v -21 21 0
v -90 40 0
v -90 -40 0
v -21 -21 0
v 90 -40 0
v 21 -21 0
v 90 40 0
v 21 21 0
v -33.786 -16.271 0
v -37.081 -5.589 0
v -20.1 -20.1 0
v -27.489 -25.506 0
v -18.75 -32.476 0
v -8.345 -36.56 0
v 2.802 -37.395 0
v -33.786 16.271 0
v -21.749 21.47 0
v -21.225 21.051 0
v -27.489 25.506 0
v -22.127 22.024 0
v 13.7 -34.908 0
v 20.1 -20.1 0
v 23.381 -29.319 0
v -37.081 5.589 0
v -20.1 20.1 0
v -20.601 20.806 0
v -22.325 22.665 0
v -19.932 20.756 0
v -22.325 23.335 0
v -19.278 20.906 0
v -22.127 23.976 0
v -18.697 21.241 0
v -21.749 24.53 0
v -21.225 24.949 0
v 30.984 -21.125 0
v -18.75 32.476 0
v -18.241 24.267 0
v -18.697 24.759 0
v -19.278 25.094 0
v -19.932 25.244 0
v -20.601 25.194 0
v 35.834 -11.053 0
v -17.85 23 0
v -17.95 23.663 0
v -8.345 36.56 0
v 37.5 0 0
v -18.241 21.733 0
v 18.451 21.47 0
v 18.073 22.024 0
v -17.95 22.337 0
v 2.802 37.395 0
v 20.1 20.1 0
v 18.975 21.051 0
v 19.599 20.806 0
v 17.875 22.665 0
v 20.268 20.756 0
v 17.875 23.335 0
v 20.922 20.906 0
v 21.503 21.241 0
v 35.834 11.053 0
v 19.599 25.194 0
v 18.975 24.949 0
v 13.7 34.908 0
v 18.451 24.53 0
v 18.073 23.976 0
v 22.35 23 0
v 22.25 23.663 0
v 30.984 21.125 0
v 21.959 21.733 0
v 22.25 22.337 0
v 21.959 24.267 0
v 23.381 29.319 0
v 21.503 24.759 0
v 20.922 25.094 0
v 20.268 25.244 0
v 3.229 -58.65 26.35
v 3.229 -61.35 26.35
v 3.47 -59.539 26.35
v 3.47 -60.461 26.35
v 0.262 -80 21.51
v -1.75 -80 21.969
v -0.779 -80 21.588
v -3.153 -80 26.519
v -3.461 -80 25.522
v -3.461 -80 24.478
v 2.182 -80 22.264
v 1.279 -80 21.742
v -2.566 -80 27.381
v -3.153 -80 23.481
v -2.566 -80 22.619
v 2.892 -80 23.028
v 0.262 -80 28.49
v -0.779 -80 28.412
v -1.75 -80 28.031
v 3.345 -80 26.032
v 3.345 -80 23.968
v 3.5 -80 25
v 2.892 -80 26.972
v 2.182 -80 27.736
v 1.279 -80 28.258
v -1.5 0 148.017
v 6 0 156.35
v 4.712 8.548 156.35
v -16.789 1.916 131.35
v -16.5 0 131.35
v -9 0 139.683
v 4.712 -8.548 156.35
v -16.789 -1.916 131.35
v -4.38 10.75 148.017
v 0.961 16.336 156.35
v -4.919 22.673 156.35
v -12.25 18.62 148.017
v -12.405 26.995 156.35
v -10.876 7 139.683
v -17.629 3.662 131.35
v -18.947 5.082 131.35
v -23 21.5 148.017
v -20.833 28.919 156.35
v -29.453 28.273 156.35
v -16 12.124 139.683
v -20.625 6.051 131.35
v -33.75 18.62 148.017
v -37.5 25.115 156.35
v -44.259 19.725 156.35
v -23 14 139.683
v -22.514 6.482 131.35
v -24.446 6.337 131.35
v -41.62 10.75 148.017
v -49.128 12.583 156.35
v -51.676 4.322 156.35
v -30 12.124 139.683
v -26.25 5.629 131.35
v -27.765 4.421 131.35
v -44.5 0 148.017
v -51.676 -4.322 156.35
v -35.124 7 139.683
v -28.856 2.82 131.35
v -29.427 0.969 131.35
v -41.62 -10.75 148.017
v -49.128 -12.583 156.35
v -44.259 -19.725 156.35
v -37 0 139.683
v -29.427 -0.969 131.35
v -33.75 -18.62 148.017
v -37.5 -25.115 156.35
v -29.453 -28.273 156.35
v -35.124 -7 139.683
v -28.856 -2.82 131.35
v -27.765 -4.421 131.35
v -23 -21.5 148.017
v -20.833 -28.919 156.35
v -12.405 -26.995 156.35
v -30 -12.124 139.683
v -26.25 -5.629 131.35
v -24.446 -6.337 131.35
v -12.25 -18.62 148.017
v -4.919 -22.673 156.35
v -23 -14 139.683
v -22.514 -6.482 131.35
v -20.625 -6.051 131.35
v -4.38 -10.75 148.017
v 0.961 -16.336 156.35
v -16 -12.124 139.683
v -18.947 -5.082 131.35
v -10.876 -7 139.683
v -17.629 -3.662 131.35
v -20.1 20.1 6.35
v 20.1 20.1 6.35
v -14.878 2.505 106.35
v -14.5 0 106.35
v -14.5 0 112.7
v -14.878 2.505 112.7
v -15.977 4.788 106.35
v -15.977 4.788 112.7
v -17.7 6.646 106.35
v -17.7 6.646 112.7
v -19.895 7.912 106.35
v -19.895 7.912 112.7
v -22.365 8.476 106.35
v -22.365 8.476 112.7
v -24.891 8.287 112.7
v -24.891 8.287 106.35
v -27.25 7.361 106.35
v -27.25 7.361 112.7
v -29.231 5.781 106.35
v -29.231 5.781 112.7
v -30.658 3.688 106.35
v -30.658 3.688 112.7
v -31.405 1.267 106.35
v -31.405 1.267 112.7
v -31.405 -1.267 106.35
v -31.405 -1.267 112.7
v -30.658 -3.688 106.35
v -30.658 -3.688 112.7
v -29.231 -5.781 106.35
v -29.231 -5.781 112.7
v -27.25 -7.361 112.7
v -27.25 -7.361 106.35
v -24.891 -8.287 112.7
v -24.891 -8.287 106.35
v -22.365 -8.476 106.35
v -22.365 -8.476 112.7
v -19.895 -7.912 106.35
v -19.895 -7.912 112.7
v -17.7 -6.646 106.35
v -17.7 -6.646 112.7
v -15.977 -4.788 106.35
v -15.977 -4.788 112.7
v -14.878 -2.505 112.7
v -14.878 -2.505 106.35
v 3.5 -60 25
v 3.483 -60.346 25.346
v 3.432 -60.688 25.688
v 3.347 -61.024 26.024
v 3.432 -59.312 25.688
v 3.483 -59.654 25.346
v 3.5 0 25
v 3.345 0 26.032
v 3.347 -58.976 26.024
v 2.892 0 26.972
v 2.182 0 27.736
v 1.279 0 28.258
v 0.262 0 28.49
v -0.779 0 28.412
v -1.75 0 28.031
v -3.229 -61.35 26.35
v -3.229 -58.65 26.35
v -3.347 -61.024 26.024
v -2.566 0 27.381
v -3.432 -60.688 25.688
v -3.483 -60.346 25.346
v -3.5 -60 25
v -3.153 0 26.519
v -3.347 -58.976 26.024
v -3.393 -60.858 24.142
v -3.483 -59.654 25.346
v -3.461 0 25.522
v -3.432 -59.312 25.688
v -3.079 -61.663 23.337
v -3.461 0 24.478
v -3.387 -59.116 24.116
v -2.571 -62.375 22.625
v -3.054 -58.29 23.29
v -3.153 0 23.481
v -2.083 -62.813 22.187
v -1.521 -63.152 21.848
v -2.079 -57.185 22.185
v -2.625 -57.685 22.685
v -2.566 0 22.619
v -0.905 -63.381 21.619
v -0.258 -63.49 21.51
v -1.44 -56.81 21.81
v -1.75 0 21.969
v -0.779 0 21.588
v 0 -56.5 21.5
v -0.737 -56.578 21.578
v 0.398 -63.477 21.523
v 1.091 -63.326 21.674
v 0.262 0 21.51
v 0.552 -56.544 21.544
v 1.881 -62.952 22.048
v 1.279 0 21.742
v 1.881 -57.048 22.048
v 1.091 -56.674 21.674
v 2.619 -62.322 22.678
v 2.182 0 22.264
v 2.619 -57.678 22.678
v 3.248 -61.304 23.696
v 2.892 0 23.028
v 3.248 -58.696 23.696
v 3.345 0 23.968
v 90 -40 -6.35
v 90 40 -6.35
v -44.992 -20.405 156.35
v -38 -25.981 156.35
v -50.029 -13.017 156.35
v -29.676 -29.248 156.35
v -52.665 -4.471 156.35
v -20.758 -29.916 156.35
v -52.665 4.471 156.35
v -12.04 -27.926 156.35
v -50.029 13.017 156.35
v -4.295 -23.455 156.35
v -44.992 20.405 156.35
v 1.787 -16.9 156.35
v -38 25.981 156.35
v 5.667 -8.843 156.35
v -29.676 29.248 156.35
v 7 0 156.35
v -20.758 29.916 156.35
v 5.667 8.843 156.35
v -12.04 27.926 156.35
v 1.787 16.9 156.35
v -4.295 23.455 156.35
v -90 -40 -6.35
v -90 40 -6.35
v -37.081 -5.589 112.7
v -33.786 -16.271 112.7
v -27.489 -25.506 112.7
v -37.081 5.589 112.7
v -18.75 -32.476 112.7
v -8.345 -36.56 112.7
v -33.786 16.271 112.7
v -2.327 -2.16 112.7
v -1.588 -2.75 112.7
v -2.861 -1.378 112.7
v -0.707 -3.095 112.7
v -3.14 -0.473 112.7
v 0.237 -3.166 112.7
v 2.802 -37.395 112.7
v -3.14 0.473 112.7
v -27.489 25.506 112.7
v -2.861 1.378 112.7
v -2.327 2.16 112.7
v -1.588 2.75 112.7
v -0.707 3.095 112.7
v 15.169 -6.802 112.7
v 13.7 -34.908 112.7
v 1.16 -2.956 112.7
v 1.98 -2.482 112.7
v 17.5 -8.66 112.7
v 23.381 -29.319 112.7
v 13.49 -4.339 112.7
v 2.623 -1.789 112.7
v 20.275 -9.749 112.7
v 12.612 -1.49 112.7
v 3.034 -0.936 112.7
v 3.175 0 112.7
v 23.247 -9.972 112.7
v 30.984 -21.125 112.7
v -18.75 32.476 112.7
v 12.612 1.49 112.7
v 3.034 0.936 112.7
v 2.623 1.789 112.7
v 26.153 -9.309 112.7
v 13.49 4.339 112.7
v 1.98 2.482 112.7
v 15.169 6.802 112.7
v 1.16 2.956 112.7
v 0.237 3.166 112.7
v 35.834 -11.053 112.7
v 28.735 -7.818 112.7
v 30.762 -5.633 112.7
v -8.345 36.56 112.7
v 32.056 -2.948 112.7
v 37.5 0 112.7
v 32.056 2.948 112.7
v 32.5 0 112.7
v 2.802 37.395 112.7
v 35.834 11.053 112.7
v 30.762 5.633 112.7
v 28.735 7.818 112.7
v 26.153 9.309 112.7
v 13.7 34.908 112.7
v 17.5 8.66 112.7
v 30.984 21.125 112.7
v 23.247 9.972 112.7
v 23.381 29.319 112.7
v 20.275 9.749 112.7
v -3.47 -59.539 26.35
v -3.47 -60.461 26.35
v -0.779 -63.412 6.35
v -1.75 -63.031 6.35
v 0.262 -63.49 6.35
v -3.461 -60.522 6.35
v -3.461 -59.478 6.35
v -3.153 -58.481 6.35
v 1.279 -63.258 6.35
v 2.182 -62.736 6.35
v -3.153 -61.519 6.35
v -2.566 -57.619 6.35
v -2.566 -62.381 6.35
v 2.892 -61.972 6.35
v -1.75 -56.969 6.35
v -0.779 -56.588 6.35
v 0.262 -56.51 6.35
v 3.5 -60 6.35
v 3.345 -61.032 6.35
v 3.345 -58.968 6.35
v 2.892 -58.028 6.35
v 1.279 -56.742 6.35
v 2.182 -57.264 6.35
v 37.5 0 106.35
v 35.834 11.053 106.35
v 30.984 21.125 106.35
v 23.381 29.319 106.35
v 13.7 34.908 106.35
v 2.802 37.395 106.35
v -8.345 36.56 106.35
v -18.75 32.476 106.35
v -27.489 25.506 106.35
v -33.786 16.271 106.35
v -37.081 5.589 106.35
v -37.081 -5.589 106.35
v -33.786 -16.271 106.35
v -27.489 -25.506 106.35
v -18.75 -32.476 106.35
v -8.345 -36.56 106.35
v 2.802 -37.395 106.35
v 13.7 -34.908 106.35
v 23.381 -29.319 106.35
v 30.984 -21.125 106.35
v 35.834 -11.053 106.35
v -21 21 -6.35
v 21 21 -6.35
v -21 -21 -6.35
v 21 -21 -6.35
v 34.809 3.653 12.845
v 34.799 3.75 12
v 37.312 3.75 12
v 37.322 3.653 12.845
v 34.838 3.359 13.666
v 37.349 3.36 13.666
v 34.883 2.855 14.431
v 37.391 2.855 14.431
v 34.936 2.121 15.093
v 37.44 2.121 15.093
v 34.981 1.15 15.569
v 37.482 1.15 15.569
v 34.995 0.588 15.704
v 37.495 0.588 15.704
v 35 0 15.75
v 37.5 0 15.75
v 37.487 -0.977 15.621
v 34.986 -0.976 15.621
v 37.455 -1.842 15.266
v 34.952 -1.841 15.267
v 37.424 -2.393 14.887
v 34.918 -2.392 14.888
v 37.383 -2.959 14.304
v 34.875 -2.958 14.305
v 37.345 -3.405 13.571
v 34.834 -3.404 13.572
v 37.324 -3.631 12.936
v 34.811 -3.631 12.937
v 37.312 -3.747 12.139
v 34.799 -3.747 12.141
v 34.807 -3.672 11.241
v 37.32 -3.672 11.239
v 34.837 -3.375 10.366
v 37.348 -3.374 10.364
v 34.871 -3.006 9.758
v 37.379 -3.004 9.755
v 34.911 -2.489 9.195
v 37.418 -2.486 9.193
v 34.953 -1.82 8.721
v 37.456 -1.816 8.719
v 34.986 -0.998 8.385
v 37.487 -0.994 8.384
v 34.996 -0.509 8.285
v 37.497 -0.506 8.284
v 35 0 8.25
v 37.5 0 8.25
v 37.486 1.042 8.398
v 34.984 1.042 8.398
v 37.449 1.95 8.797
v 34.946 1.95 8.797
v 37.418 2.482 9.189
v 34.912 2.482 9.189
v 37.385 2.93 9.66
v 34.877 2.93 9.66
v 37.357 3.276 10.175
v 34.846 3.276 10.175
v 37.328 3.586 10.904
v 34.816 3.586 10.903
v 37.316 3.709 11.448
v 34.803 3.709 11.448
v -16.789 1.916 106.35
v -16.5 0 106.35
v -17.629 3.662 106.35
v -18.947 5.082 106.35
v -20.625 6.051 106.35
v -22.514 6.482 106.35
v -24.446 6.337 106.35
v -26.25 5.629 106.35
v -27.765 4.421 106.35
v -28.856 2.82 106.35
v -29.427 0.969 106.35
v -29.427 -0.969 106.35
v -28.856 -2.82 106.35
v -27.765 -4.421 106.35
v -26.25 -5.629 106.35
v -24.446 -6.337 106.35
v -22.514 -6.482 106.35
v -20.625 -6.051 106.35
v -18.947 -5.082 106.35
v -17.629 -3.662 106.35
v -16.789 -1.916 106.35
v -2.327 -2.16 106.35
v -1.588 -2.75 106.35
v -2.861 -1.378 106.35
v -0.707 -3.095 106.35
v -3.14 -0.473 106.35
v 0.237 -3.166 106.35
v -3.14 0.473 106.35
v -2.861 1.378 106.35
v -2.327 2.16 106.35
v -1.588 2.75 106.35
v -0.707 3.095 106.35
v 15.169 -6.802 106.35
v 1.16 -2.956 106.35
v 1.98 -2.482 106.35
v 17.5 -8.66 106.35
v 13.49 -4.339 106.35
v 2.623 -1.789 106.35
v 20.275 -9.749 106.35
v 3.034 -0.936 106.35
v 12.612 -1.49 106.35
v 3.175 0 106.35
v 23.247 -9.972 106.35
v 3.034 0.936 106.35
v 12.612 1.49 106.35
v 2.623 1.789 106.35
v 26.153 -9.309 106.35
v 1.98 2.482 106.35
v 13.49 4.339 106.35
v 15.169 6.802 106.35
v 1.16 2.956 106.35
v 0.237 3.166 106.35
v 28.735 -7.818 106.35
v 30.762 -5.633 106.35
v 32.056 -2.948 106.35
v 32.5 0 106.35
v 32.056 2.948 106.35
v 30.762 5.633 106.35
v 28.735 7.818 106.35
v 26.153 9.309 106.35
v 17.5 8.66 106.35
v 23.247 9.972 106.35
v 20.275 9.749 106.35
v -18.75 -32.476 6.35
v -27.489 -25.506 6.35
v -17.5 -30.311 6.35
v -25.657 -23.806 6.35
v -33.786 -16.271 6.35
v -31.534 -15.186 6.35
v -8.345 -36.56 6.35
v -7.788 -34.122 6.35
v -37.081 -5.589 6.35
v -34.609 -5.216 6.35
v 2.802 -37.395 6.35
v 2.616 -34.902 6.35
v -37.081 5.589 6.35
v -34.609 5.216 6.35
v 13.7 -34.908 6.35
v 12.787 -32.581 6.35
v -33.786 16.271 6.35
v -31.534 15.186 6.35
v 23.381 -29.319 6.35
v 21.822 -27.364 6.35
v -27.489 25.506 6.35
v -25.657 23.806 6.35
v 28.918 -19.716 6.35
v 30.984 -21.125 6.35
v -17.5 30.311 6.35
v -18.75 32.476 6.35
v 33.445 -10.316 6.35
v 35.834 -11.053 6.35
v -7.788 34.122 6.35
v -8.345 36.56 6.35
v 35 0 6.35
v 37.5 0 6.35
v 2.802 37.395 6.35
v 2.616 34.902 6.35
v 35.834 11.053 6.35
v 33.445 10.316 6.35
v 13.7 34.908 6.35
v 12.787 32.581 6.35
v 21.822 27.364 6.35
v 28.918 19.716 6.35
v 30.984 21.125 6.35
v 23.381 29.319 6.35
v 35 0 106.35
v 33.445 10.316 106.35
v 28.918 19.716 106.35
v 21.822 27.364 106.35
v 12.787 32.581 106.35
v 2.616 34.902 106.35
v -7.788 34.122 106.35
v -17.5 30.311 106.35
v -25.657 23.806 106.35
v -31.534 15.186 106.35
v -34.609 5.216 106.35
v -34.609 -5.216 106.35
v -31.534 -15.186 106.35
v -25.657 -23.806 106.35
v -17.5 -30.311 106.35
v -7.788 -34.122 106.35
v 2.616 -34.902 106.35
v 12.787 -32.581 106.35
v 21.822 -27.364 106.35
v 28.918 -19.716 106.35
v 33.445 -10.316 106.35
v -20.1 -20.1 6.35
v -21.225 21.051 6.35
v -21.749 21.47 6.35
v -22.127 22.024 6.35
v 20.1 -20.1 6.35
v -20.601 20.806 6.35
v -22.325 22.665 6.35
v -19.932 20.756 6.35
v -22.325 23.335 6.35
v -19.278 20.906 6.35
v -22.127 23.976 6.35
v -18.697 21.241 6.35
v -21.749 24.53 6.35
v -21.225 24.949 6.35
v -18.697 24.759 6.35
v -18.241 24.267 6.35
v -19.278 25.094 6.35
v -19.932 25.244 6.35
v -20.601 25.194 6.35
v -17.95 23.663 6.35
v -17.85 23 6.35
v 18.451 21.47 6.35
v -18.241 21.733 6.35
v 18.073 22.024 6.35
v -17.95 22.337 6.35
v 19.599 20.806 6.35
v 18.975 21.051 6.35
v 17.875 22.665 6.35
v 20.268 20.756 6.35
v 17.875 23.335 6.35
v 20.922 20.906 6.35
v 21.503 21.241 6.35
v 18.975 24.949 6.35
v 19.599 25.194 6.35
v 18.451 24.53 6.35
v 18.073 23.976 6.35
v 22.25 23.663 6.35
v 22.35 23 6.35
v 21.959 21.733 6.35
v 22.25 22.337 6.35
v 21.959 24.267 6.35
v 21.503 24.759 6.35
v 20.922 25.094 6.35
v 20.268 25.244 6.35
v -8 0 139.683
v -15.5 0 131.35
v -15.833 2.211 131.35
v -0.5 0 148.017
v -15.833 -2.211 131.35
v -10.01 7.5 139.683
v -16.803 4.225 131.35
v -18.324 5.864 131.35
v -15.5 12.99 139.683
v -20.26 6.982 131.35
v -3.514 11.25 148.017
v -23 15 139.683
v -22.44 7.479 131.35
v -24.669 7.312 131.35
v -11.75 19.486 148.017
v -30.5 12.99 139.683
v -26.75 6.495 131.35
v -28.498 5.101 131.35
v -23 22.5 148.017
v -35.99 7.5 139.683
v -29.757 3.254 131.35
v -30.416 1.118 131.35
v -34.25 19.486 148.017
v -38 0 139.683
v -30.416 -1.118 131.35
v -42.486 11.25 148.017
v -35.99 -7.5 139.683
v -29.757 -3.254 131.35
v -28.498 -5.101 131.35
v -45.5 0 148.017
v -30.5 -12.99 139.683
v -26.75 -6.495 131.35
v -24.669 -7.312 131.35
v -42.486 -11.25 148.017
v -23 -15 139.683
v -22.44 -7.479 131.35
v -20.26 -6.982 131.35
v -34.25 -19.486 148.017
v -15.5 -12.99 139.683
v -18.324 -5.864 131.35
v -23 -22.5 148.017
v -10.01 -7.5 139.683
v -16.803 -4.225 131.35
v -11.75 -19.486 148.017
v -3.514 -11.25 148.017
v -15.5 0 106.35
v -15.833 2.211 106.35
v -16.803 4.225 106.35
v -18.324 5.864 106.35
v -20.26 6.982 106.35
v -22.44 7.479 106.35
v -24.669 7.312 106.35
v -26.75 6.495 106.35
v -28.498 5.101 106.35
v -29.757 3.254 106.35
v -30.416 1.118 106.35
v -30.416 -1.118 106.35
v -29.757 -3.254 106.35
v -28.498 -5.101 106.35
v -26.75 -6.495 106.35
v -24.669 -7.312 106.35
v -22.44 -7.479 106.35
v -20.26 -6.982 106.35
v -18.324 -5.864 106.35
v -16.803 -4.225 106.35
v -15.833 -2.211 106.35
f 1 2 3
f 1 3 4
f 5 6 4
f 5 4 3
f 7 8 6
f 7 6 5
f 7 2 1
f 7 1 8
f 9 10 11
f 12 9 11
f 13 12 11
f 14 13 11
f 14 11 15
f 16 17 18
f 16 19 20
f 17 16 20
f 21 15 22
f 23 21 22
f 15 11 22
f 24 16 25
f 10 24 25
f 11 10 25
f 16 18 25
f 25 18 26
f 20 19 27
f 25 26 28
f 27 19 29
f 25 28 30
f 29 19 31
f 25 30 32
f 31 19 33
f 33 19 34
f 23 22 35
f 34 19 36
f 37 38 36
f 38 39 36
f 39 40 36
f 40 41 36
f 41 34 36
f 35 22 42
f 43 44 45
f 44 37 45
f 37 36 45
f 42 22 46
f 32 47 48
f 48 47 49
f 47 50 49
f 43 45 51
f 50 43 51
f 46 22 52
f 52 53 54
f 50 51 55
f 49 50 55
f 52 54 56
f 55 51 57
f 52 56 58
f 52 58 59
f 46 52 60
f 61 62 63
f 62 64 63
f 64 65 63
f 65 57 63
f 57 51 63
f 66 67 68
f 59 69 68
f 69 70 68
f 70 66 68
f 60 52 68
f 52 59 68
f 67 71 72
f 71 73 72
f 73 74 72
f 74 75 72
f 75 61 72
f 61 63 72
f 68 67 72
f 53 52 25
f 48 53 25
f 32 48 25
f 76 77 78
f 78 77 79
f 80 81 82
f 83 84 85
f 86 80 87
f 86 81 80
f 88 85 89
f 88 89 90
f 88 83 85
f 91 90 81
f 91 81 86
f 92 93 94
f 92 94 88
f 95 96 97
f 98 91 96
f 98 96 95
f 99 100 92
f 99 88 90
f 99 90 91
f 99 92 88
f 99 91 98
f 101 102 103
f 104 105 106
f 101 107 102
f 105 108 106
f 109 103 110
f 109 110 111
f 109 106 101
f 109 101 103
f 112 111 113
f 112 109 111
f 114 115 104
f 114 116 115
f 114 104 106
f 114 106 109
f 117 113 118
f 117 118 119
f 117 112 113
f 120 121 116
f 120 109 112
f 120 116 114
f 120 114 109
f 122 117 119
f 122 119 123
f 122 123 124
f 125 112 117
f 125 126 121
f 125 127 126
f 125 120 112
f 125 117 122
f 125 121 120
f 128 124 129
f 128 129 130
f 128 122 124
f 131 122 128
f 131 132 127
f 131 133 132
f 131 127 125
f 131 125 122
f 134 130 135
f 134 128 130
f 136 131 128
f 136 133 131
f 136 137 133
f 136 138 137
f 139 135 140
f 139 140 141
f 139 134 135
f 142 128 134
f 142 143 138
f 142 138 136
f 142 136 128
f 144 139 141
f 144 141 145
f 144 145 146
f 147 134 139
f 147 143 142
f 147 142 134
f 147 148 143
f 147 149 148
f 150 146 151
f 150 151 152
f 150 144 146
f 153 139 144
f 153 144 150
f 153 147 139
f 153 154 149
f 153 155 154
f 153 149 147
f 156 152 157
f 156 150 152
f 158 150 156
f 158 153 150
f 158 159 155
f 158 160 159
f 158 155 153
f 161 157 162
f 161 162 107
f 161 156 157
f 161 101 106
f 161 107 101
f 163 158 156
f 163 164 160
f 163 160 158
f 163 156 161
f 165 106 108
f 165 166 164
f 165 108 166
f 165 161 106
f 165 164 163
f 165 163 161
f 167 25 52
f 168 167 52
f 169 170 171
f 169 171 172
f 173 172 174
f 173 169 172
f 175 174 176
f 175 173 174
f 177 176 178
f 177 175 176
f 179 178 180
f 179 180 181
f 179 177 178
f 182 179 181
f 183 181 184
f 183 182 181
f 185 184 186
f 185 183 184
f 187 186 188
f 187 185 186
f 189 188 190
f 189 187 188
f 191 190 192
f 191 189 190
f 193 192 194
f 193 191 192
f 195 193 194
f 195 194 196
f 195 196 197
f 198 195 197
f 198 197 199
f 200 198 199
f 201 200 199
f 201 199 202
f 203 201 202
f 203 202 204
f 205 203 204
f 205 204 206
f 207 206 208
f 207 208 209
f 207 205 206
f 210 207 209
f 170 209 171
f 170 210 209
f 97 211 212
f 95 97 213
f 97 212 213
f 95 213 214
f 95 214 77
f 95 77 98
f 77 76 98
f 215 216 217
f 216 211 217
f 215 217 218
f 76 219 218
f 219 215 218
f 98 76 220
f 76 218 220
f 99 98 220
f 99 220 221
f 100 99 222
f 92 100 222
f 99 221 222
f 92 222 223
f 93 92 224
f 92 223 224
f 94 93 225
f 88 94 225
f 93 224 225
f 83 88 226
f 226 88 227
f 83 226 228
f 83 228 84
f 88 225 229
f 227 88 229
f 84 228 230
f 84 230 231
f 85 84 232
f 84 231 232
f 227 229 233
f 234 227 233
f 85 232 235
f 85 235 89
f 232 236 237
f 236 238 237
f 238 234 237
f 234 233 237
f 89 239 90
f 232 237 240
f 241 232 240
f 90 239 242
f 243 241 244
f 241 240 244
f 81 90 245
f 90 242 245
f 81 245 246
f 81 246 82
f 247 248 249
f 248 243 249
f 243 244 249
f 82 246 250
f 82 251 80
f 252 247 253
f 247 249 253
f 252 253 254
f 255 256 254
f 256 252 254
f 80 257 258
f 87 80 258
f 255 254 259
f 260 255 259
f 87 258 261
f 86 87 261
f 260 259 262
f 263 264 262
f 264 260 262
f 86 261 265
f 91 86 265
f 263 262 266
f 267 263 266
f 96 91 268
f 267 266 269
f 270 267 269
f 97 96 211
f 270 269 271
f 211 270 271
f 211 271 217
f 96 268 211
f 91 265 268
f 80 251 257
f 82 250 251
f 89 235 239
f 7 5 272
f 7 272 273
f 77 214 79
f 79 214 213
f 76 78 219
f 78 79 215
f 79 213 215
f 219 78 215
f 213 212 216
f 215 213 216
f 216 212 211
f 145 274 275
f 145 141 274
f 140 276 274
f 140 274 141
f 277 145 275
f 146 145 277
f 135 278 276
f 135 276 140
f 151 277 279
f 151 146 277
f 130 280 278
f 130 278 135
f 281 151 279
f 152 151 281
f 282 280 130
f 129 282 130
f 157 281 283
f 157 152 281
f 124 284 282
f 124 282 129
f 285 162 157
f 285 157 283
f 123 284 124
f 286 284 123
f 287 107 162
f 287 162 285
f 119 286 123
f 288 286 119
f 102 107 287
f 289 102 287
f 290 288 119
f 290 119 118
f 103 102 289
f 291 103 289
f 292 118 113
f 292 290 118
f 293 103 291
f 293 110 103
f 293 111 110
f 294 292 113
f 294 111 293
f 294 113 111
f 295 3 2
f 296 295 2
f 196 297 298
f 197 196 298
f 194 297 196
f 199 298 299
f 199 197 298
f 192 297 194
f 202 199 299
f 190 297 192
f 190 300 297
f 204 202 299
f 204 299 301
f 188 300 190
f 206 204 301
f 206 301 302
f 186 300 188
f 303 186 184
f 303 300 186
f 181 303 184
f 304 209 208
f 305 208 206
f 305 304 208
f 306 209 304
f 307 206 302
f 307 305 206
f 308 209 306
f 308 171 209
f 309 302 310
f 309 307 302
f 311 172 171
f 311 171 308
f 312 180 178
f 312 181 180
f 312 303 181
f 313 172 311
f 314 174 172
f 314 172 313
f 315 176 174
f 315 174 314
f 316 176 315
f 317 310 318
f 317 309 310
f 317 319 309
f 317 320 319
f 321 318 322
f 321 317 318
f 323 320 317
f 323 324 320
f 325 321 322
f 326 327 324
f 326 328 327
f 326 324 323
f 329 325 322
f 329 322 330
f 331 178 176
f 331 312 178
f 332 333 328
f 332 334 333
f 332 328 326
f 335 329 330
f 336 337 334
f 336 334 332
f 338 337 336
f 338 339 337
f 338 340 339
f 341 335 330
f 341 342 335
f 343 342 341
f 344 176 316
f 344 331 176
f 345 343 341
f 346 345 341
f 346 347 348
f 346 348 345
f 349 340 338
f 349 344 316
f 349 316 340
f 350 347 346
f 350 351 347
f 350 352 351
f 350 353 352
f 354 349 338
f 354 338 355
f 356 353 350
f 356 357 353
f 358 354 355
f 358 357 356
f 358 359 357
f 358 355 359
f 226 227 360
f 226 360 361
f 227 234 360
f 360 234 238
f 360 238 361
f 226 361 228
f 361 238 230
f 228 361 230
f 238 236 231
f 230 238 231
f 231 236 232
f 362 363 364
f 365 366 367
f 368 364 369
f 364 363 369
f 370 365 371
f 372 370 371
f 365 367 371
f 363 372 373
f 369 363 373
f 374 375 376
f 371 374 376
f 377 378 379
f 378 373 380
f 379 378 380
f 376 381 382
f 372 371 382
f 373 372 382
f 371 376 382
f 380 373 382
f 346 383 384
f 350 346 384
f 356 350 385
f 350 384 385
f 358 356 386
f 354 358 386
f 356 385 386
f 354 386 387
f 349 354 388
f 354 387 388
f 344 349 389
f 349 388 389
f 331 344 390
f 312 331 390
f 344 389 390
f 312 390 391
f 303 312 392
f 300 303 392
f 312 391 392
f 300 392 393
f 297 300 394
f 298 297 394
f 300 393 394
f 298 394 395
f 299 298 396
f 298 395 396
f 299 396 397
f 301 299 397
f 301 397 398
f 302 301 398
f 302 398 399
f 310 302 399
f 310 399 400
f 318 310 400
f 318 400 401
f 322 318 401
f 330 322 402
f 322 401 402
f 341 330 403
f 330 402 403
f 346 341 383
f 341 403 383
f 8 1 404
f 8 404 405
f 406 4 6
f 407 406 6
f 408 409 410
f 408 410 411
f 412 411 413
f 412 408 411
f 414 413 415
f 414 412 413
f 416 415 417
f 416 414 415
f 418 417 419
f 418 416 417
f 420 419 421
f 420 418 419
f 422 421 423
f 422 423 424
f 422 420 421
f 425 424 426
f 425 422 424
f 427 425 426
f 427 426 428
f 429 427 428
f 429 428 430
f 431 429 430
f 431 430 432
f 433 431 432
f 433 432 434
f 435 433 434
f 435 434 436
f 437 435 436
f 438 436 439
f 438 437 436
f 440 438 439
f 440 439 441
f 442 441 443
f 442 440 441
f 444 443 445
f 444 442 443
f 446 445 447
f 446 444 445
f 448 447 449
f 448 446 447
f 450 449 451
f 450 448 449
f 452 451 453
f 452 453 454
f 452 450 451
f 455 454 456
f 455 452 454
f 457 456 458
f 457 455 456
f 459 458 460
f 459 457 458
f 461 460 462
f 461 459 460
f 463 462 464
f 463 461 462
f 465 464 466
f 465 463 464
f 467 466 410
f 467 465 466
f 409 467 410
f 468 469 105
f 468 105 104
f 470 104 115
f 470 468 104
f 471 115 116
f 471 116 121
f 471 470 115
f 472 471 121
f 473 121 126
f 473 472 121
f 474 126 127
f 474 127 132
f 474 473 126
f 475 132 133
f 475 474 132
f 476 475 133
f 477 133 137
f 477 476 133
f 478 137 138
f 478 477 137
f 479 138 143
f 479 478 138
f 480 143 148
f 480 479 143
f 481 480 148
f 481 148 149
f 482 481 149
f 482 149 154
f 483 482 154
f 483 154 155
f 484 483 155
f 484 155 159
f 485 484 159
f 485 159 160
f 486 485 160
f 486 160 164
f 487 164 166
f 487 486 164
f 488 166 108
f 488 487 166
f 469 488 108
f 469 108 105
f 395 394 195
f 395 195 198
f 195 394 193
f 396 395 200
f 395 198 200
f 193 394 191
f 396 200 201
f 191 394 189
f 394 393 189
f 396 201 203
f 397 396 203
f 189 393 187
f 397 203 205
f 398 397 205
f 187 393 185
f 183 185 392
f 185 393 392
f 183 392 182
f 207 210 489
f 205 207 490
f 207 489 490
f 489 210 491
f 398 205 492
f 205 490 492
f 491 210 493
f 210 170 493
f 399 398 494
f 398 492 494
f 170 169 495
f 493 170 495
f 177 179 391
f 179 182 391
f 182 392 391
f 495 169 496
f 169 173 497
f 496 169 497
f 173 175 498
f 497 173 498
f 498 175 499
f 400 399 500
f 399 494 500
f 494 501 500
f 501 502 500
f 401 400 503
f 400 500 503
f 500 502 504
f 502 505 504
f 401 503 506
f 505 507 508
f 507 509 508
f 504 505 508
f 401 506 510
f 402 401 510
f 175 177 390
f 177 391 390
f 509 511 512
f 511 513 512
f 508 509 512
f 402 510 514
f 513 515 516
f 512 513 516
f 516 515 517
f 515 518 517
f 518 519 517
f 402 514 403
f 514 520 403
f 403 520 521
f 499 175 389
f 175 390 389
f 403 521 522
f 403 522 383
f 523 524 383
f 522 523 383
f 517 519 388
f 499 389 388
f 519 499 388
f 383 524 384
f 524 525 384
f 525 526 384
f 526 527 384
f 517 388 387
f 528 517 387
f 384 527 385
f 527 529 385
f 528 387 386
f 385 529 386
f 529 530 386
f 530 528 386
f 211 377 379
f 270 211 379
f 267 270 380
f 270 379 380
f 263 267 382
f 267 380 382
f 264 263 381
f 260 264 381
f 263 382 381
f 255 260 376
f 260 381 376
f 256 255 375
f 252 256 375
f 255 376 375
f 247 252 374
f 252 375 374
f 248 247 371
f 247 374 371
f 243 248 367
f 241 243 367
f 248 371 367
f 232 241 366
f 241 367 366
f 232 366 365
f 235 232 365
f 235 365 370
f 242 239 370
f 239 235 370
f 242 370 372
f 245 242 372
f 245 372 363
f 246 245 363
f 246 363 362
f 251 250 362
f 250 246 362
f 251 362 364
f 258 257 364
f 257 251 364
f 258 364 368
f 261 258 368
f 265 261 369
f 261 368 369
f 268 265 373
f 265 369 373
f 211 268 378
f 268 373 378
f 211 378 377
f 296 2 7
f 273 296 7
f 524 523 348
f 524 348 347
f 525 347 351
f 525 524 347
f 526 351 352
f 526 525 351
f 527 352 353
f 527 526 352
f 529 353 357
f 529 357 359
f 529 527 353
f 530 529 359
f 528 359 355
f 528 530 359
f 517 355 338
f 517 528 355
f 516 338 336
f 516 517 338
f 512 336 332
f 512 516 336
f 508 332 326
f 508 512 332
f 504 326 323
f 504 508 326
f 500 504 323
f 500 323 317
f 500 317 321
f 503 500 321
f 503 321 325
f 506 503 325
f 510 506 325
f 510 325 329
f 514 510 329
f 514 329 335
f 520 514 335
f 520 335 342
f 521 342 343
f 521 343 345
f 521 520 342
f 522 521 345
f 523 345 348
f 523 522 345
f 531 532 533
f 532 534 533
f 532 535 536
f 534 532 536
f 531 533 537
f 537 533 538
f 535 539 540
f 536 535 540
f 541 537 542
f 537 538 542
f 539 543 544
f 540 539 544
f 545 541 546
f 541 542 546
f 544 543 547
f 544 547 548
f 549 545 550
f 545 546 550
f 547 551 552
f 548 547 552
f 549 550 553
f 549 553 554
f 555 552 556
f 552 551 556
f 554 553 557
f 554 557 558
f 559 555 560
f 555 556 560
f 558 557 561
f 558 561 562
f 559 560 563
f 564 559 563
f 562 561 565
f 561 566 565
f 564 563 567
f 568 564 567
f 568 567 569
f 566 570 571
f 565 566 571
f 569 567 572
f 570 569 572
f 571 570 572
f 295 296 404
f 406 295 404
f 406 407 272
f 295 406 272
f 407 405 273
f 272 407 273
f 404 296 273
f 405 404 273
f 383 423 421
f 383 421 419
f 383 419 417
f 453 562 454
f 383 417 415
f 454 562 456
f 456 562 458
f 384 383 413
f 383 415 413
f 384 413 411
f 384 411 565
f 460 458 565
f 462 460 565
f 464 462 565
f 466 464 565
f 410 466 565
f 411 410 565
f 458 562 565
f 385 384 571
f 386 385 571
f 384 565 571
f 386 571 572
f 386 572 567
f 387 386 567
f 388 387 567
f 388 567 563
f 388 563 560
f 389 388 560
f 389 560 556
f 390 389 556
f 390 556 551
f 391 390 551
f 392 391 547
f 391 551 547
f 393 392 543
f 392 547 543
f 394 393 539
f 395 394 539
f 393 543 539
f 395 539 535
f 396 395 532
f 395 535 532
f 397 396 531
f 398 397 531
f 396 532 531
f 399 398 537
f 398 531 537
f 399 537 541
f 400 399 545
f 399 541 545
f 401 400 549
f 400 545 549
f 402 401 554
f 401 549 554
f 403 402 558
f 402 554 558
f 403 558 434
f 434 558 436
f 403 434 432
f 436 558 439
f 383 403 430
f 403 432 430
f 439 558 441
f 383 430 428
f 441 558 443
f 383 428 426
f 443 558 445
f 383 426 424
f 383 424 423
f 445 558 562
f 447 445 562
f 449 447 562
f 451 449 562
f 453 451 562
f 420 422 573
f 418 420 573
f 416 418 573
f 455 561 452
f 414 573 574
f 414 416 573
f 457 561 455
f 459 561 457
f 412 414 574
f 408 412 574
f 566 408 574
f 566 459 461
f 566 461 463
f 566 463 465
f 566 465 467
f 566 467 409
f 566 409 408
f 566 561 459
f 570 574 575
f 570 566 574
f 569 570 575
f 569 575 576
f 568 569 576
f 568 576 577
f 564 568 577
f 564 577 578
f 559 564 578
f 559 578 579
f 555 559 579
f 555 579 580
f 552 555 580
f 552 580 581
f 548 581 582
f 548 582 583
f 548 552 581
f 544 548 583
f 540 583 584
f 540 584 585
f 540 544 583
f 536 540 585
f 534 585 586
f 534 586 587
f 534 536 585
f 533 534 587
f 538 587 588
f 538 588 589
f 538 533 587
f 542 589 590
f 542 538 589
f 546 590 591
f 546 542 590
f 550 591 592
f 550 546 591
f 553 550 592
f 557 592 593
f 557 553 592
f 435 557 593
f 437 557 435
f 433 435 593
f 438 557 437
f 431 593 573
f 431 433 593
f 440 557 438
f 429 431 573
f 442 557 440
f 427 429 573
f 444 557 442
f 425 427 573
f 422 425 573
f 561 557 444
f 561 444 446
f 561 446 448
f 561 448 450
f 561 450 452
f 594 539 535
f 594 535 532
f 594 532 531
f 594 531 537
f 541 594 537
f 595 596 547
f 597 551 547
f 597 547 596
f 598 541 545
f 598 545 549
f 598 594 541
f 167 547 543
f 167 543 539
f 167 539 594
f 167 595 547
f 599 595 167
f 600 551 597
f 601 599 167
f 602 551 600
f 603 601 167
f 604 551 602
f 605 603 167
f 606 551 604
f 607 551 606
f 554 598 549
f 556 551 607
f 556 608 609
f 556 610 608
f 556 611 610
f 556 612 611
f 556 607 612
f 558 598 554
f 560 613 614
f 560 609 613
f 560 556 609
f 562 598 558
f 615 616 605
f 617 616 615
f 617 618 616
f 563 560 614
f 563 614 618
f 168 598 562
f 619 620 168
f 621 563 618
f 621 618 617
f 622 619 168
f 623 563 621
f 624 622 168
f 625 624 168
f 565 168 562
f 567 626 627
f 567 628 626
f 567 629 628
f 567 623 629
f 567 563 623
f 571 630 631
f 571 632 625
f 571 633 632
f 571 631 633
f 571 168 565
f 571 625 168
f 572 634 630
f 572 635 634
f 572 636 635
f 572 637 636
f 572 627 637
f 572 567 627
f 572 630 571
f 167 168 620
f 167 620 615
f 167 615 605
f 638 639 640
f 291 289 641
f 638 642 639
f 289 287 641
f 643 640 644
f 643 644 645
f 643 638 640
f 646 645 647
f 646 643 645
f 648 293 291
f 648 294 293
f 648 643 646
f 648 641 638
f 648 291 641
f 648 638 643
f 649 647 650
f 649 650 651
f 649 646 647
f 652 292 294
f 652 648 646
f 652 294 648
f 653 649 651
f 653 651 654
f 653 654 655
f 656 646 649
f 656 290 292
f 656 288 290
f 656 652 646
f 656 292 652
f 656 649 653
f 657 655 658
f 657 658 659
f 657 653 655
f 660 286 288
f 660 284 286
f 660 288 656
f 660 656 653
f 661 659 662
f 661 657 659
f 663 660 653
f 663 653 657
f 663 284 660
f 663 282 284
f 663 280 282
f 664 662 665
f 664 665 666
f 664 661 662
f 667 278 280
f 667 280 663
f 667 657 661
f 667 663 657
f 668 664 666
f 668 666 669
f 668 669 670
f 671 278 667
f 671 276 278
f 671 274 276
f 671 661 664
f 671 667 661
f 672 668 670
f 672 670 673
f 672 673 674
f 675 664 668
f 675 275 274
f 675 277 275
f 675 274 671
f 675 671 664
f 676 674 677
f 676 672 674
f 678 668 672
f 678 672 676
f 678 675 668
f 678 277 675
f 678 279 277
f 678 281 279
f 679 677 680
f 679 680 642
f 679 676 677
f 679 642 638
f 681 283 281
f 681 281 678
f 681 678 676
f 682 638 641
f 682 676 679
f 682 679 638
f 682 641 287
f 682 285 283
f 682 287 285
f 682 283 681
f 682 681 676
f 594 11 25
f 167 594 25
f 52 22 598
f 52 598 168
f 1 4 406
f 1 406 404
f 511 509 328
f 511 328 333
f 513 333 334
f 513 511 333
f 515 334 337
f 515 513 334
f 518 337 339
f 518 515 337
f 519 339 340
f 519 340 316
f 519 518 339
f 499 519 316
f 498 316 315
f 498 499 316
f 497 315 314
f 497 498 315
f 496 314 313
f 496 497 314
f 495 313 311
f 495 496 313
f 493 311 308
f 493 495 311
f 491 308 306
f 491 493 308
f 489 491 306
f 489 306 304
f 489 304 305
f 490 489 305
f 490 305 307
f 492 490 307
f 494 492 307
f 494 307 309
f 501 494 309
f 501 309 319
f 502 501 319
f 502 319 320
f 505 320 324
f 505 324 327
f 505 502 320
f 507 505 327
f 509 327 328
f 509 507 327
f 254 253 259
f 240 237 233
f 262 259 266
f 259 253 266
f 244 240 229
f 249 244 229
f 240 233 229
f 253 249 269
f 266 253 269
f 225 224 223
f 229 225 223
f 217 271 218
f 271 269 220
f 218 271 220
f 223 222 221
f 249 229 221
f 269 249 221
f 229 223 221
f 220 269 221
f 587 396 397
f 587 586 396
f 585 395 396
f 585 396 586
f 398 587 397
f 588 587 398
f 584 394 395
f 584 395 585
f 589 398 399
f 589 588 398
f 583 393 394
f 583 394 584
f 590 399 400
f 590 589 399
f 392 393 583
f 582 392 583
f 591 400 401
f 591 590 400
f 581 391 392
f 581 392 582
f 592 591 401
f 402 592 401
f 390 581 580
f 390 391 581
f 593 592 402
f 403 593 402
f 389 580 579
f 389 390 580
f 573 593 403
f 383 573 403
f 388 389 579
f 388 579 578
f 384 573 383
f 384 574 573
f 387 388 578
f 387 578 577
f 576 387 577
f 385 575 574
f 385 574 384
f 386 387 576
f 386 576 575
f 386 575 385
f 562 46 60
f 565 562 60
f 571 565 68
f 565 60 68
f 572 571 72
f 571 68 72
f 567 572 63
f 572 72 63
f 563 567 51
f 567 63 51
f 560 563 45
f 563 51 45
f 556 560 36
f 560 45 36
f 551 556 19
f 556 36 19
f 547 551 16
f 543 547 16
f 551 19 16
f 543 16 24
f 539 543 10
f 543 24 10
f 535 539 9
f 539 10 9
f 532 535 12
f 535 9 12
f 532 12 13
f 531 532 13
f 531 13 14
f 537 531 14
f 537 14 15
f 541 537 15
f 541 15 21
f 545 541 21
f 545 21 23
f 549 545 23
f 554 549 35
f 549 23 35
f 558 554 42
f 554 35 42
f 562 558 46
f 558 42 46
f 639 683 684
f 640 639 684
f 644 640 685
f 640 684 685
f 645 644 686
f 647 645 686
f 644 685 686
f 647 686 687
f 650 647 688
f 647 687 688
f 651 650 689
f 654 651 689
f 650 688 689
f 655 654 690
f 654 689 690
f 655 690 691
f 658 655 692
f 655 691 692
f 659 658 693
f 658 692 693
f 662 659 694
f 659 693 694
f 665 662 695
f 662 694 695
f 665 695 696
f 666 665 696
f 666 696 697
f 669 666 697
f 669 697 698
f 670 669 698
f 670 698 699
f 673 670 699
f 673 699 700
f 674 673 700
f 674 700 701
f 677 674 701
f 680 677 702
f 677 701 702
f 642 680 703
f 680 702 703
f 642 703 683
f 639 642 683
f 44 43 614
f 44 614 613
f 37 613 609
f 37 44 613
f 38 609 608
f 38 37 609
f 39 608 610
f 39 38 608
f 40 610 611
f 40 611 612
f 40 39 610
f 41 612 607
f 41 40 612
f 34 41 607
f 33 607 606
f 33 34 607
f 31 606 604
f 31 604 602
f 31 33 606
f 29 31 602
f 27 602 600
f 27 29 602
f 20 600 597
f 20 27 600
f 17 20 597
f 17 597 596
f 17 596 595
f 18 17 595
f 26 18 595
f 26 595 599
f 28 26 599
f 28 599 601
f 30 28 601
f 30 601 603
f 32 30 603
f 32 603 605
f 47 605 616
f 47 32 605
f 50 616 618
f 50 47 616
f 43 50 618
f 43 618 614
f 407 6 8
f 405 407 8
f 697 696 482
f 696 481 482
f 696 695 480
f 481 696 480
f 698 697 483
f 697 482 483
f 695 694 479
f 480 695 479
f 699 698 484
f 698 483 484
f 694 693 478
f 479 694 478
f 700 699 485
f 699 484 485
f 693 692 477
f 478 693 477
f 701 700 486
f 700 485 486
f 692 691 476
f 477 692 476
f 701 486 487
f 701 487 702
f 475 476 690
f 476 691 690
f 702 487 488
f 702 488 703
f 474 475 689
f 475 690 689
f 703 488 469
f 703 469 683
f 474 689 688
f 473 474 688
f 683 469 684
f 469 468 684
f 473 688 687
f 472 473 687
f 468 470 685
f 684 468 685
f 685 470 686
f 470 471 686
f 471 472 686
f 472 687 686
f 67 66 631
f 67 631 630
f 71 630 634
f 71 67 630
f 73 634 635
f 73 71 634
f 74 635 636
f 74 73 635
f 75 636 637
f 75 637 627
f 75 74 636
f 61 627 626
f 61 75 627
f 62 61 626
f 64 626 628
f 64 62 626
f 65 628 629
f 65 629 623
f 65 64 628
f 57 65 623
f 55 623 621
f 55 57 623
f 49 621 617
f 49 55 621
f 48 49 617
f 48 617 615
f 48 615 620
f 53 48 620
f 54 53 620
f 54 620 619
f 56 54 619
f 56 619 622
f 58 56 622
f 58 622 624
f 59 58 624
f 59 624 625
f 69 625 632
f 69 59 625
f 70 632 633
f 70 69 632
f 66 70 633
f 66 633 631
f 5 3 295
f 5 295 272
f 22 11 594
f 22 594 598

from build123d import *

# Parameters (mm, degrees)
F0_R       = 37.5
F0_R_2     = 2.25
F0_W       = 40.2
F0_H       = 40.2
F1_DEPTH   = 6.35
F3_R       = 37.5
F3_R_2     = 35
F4_DEPTH   = 100
F6_R       = 37.5
F6_R_2     = 8.5
F6_R_3     = 3.175
F6_R_4     = 10
F7_DEPTH   = 6.35
F9_W       = 180
F9_H       = 80
F9_W_2     = 42
F9_H_2     = 42
F10_DEPTH  = 6.35
F13_R      = 3.75
F14_DEPTH  = 75
F15_R      = 3.5
F16_DEPTH  = 80
F17_R      = 3.5
F18_DEPTH  = 20
F21_R      = 7.5
F22_DEPTH  = 25
F22_FACE_R = 7.5
F23_R      = 30
F25_R      = 6.5
F26_DEPTH  = 25
F27_R      = 29
F29_R      = 6.5


# Not quite as in the source:
# - a feature of the source that left no trace in its solid (it failed there, or was rolled back) is left out


with BuildPart() as f1:
    # F0 (on Top) → F1 (new body)
    with BuildSketch(Plane.XY):
        Circle(F0_R)
        with Locations((-20.1, 23)):
            Circle(F0_R_2, mode=Mode.SUBTRACT)
        Rectangle(F0_W, F0_H, mode=Mode.SUBTRACT)
        with Locations((20.1, 23)):
            Circle(F0_R_2, mode=Mode.SUBTRACT)
    extrude(amount=F1_DEPTH)


with BuildPart() as f4:
    # F3 (on offset) → F4 (new body)
    with BuildSketch(Plane.XY.offset(6.35)):
        Circle(F3_R)
        Circle(F3_R_2, mode=Mode.SUBTRACT)
    extrude(amount=F4_DEPTH)

    # F13 (on Right) → F14 (cut)
    with BuildSketch(Plane.YZ):
        with Locations((0, 12)):
            Circle(F13_R)
    extrude(amount=F14_DEPTH, mode=Mode.SUBTRACT)


with BuildPart() as f7:
    # F6 (on offset) → F7 (new body)
    with BuildSketch(Plane.XY.offset(106.35)):
        Circle(F6_R)
        with Locations((-23, 0)):
            Circle(F6_R_2, mode=Mode.SUBTRACT)
        Circle(F6_R_3, mode=Mode.SUBTRACT)
        with Locations((22.5, 0)):
            Circle(F6_R_4, mode=Mode.SUBTRACT)
    extrude(amount=F7_DEPTH)


with BuildPart() as f10:
    # F9 (on Top) → F10 (new body)
    with BuildSketch(Plane.XY):
        Rectangle(F9_W, F9_H)
        Rectangle(F9_W_2, F9_H_2, mode=Mode.SUBTRACT)
    extrude(amount=-F10_DEPTH)


with BuildPart() as f16:
    # F15 (on Front) → F16 (new body)
    with BuildSketch(Plane.XZ):
        with Locations((0, 25)):
            Circle(F15_R)
    extrude(amount=F16_DEPTH)

    # F17 (on offset) → F18 (join)
    with BuildSketch(Plane.XY.offset(6.35)):
        with Locations((0, -60)):
            Circle(F17_R)
    extrude(amount=F18_DEPTH)


with BuildPart() as f22:
    # F21 (on offset) → F22 (new body)
    with BuildSketch(Plane.XY.offset(106.35)):
        with Locations((-23, 0)):
            Circle(F21_R)
    extrude(amount=F22_DEPTH)

    # F22_face (on face) → F24 section 0
    with BuildSketch(Plane(origin=(-23, 0, 131.35), x_dir=(1, 0, 0), z_dir=(0, 0, 1))):
        Circle(F22_FACE_R)
    # F23 (on offset) → F24 section 1
    with BuildSketch(Plane.XY.offset(156.35)):
        with Locations((-23, 0)):
            Circle(F23_R)
    loft()

    # F25 (on offset) → F26 (cut)
    with BuildSketch(Plane.XY.offset(106.35)):
        with Locations((-23, 0)):
            Circle(F25_R)
    extrude(amount=F26_DEPTH, mode=Mode.SUBTRACT)

    # F27 (on offset) → F30 section 0
    with BuildSketch(Plane.XY.offset(156.35)):
        with Locations((-23, 0)):
            Circle(F27_R)
    # F29 (on offset) → F30 section 1
    with BuildSketch(Plane.XY.offset(131.35)):
        with Locations((-23, 0)):
            Circle(F29_R)
    loft(mode=Mode.SUBTRACT)


solid = Compound([f1.part, f4.part, f7.part, f10.part, f16.part, f22.part])
